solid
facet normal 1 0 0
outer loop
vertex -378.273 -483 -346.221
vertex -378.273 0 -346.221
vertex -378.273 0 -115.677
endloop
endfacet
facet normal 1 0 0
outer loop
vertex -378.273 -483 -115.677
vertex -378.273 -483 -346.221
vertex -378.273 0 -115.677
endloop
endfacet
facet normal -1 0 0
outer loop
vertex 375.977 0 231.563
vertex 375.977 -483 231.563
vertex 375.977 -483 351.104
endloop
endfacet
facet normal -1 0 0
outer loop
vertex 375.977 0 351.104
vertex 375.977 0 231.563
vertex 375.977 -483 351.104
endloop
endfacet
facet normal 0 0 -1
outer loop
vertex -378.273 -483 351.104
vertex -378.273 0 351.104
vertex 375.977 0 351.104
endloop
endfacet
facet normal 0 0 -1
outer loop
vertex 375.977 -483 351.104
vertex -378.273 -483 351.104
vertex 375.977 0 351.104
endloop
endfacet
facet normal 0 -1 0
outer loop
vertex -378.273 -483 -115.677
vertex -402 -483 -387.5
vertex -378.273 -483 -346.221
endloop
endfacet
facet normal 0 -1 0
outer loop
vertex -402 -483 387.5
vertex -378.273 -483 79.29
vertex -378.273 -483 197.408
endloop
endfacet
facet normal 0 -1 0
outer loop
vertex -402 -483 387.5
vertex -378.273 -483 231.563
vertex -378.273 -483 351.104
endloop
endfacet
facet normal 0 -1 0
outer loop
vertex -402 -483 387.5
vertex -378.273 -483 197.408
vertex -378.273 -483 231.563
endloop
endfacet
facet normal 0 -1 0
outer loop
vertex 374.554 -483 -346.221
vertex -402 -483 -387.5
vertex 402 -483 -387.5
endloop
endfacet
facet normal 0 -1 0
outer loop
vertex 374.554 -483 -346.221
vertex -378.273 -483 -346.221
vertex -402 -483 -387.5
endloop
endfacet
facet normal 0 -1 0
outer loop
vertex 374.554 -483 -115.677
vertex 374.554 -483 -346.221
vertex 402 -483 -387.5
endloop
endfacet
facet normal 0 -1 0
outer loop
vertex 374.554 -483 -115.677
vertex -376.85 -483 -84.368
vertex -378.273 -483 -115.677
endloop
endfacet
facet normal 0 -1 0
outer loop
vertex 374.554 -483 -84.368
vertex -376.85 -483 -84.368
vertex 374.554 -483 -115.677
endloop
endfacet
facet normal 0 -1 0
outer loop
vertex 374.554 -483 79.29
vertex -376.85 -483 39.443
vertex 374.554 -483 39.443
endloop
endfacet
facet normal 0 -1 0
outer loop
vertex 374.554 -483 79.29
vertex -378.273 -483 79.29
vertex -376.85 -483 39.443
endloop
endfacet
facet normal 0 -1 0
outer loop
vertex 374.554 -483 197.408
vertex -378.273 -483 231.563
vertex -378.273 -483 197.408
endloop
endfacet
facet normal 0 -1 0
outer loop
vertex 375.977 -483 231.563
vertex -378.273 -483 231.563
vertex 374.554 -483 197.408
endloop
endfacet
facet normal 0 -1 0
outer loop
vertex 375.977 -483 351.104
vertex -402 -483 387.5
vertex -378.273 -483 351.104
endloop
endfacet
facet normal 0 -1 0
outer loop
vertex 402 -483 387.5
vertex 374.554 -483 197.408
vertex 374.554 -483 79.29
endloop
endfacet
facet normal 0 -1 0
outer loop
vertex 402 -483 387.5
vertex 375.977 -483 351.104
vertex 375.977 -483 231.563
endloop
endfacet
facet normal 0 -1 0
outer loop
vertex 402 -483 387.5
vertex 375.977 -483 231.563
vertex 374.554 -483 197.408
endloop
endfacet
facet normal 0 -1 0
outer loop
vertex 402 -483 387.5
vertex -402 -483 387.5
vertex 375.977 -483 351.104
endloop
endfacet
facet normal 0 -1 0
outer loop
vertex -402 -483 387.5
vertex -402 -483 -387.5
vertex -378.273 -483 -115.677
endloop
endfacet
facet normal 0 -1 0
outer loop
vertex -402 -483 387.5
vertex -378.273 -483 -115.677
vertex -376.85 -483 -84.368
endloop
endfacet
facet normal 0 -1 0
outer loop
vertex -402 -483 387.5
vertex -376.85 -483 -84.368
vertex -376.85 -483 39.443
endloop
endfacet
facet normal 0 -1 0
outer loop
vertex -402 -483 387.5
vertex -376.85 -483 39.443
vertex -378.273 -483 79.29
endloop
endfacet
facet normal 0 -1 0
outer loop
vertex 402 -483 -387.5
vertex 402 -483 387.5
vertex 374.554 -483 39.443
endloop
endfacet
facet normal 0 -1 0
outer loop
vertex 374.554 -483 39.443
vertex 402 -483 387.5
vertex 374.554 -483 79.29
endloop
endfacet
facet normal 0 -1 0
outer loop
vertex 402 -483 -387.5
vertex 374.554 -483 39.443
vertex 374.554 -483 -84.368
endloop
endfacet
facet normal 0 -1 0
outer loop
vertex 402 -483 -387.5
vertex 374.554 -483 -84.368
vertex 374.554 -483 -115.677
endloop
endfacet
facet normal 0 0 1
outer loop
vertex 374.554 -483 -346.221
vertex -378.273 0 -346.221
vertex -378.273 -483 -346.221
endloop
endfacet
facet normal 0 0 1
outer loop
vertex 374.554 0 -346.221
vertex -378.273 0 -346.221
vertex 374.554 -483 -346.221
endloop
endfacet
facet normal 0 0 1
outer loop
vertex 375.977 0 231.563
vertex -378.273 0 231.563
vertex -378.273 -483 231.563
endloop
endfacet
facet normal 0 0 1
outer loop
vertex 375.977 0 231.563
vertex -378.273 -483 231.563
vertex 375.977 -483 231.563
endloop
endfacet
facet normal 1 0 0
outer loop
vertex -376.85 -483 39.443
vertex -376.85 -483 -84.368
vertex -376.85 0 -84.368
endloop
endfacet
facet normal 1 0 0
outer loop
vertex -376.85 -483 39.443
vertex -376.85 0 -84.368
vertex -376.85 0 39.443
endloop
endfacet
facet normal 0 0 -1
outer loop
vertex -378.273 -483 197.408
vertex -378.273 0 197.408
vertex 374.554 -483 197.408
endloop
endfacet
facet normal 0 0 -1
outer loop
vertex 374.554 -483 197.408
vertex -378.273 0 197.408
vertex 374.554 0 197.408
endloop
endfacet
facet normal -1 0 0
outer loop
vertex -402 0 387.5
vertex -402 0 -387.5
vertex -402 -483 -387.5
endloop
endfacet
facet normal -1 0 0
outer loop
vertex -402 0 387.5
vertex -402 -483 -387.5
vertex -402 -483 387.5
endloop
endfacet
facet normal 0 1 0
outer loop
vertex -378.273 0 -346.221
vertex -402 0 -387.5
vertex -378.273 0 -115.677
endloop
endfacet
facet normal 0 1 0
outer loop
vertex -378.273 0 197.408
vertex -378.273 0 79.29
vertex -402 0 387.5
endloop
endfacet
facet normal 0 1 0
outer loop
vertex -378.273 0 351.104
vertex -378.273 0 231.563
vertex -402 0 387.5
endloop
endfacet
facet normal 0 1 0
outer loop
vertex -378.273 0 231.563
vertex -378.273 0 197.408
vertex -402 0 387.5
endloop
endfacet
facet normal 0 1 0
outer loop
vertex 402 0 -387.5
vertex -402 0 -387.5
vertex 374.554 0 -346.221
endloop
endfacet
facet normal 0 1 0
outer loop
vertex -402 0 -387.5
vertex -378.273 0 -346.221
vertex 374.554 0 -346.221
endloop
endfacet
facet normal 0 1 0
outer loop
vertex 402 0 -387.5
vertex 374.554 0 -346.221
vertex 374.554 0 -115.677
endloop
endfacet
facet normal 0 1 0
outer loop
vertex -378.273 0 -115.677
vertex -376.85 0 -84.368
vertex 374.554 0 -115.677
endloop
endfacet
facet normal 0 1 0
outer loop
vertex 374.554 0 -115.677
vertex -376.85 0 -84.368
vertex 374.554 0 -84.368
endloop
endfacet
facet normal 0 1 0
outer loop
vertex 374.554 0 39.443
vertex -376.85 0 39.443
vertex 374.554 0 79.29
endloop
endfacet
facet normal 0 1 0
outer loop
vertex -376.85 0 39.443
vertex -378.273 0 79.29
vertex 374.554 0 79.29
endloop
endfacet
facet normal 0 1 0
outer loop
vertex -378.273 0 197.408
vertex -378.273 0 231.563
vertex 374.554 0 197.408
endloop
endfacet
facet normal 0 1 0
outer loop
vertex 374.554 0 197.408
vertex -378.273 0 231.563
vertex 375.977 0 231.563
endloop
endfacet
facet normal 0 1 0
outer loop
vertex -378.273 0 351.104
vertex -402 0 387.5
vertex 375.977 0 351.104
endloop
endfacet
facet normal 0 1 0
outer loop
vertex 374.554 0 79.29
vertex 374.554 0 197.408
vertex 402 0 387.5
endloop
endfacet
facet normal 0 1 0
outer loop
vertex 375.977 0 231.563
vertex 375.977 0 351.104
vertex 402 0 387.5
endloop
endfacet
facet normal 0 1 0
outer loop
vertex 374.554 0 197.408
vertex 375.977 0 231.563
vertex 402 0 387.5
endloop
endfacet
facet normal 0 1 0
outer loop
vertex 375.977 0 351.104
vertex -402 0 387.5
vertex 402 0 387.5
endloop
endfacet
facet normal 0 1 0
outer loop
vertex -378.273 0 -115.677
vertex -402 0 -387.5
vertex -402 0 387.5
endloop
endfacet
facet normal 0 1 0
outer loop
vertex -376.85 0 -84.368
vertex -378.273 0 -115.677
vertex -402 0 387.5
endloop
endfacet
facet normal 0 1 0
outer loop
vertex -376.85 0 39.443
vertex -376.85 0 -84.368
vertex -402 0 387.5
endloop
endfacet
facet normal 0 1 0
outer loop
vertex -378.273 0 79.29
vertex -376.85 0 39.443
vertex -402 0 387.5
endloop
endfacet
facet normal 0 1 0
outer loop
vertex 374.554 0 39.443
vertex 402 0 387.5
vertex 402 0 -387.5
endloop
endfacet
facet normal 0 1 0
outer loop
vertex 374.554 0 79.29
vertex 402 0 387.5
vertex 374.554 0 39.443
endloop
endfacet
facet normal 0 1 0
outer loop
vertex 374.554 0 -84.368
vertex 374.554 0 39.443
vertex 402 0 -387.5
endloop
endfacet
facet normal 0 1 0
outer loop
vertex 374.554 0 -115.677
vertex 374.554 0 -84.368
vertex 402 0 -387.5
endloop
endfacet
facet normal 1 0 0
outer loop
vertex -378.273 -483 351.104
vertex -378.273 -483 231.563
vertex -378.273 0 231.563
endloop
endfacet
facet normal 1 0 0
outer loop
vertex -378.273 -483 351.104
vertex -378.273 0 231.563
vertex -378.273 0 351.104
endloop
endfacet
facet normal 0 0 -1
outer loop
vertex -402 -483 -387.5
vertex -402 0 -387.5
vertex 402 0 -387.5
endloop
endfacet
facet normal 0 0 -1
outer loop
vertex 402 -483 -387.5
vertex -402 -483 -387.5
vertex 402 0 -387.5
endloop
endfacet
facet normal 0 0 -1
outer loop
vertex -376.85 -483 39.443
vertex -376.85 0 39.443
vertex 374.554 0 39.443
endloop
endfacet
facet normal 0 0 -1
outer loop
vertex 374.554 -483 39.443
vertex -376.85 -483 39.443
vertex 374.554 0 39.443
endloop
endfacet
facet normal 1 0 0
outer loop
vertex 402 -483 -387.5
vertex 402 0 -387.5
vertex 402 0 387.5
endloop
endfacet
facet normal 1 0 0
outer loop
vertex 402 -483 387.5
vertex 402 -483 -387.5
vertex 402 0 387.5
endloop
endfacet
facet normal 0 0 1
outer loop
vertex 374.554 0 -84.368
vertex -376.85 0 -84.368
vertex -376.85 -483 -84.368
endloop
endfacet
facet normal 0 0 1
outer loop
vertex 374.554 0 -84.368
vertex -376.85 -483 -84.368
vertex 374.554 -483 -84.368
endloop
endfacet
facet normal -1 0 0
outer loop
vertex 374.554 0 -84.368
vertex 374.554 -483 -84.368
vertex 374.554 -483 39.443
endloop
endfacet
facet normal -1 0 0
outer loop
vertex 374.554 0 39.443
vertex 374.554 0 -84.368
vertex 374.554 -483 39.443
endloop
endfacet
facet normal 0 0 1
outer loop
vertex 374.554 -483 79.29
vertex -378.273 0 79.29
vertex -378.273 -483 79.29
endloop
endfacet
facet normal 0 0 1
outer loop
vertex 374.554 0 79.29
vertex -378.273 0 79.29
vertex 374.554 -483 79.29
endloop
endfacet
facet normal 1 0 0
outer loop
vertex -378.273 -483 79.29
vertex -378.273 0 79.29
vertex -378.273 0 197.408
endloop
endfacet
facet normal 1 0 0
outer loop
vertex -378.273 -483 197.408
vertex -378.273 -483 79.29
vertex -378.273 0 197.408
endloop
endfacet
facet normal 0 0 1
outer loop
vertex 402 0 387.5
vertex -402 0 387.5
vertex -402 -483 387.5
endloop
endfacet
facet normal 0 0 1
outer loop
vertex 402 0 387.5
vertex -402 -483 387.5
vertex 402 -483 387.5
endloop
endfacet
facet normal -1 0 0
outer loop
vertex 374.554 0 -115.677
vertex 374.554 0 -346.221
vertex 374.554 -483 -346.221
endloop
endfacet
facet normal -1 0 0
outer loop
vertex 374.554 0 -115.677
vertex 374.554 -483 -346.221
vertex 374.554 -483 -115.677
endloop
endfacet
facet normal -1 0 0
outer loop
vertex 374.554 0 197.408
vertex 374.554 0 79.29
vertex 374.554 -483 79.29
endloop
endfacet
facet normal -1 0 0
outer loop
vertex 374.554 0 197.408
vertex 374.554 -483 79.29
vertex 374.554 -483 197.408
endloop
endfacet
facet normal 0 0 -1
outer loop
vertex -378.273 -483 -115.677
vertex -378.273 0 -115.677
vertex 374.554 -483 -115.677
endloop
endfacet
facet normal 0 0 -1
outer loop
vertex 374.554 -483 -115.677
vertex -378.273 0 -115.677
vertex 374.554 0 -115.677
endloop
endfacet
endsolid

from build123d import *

# Parameters (mm, degrees)
F0_W     = 804
F0_H     = 775
F0_W_2   = 752.827108
F0_H_2   = 230.544425
F0_W_3   = 751.404017
F0_H_3   = 123.810884
F0_H_4   = 118.118427
F0_W_4   = 754.250229
F0_H_5   = 119.541556
F1_DEPTH = 483


with BuildPart() as f1:
    # F0 (on Front) → F1 (new body)
    with BuildSketch(Plane.XZ):
        Rectangle(F0_W, F0_H)
        with Locations((-1.859218, -230.949025)):
            Rectangle(F0_W_2, F0_H_2, mode=Mode.SUBTRACT)
        with Locations((-1.147672, -22.462869)):
            Rectangle(F0_W_3, F0_H_3, mode=Mode.SUBTRACT)
        with Locations((-1.859218, 138.34897)):
            Rectangle(F0_W_2, F0_H_4, mode=Mode.SUBTRACT)
        with Locations((-1.147658, 291.33369)):
            Rectangle(F0_W_4, F0_H_5, mode=Mode.SUBTRACT)
    extrude(amount=F1_DEPTH)


solid = f1.part
